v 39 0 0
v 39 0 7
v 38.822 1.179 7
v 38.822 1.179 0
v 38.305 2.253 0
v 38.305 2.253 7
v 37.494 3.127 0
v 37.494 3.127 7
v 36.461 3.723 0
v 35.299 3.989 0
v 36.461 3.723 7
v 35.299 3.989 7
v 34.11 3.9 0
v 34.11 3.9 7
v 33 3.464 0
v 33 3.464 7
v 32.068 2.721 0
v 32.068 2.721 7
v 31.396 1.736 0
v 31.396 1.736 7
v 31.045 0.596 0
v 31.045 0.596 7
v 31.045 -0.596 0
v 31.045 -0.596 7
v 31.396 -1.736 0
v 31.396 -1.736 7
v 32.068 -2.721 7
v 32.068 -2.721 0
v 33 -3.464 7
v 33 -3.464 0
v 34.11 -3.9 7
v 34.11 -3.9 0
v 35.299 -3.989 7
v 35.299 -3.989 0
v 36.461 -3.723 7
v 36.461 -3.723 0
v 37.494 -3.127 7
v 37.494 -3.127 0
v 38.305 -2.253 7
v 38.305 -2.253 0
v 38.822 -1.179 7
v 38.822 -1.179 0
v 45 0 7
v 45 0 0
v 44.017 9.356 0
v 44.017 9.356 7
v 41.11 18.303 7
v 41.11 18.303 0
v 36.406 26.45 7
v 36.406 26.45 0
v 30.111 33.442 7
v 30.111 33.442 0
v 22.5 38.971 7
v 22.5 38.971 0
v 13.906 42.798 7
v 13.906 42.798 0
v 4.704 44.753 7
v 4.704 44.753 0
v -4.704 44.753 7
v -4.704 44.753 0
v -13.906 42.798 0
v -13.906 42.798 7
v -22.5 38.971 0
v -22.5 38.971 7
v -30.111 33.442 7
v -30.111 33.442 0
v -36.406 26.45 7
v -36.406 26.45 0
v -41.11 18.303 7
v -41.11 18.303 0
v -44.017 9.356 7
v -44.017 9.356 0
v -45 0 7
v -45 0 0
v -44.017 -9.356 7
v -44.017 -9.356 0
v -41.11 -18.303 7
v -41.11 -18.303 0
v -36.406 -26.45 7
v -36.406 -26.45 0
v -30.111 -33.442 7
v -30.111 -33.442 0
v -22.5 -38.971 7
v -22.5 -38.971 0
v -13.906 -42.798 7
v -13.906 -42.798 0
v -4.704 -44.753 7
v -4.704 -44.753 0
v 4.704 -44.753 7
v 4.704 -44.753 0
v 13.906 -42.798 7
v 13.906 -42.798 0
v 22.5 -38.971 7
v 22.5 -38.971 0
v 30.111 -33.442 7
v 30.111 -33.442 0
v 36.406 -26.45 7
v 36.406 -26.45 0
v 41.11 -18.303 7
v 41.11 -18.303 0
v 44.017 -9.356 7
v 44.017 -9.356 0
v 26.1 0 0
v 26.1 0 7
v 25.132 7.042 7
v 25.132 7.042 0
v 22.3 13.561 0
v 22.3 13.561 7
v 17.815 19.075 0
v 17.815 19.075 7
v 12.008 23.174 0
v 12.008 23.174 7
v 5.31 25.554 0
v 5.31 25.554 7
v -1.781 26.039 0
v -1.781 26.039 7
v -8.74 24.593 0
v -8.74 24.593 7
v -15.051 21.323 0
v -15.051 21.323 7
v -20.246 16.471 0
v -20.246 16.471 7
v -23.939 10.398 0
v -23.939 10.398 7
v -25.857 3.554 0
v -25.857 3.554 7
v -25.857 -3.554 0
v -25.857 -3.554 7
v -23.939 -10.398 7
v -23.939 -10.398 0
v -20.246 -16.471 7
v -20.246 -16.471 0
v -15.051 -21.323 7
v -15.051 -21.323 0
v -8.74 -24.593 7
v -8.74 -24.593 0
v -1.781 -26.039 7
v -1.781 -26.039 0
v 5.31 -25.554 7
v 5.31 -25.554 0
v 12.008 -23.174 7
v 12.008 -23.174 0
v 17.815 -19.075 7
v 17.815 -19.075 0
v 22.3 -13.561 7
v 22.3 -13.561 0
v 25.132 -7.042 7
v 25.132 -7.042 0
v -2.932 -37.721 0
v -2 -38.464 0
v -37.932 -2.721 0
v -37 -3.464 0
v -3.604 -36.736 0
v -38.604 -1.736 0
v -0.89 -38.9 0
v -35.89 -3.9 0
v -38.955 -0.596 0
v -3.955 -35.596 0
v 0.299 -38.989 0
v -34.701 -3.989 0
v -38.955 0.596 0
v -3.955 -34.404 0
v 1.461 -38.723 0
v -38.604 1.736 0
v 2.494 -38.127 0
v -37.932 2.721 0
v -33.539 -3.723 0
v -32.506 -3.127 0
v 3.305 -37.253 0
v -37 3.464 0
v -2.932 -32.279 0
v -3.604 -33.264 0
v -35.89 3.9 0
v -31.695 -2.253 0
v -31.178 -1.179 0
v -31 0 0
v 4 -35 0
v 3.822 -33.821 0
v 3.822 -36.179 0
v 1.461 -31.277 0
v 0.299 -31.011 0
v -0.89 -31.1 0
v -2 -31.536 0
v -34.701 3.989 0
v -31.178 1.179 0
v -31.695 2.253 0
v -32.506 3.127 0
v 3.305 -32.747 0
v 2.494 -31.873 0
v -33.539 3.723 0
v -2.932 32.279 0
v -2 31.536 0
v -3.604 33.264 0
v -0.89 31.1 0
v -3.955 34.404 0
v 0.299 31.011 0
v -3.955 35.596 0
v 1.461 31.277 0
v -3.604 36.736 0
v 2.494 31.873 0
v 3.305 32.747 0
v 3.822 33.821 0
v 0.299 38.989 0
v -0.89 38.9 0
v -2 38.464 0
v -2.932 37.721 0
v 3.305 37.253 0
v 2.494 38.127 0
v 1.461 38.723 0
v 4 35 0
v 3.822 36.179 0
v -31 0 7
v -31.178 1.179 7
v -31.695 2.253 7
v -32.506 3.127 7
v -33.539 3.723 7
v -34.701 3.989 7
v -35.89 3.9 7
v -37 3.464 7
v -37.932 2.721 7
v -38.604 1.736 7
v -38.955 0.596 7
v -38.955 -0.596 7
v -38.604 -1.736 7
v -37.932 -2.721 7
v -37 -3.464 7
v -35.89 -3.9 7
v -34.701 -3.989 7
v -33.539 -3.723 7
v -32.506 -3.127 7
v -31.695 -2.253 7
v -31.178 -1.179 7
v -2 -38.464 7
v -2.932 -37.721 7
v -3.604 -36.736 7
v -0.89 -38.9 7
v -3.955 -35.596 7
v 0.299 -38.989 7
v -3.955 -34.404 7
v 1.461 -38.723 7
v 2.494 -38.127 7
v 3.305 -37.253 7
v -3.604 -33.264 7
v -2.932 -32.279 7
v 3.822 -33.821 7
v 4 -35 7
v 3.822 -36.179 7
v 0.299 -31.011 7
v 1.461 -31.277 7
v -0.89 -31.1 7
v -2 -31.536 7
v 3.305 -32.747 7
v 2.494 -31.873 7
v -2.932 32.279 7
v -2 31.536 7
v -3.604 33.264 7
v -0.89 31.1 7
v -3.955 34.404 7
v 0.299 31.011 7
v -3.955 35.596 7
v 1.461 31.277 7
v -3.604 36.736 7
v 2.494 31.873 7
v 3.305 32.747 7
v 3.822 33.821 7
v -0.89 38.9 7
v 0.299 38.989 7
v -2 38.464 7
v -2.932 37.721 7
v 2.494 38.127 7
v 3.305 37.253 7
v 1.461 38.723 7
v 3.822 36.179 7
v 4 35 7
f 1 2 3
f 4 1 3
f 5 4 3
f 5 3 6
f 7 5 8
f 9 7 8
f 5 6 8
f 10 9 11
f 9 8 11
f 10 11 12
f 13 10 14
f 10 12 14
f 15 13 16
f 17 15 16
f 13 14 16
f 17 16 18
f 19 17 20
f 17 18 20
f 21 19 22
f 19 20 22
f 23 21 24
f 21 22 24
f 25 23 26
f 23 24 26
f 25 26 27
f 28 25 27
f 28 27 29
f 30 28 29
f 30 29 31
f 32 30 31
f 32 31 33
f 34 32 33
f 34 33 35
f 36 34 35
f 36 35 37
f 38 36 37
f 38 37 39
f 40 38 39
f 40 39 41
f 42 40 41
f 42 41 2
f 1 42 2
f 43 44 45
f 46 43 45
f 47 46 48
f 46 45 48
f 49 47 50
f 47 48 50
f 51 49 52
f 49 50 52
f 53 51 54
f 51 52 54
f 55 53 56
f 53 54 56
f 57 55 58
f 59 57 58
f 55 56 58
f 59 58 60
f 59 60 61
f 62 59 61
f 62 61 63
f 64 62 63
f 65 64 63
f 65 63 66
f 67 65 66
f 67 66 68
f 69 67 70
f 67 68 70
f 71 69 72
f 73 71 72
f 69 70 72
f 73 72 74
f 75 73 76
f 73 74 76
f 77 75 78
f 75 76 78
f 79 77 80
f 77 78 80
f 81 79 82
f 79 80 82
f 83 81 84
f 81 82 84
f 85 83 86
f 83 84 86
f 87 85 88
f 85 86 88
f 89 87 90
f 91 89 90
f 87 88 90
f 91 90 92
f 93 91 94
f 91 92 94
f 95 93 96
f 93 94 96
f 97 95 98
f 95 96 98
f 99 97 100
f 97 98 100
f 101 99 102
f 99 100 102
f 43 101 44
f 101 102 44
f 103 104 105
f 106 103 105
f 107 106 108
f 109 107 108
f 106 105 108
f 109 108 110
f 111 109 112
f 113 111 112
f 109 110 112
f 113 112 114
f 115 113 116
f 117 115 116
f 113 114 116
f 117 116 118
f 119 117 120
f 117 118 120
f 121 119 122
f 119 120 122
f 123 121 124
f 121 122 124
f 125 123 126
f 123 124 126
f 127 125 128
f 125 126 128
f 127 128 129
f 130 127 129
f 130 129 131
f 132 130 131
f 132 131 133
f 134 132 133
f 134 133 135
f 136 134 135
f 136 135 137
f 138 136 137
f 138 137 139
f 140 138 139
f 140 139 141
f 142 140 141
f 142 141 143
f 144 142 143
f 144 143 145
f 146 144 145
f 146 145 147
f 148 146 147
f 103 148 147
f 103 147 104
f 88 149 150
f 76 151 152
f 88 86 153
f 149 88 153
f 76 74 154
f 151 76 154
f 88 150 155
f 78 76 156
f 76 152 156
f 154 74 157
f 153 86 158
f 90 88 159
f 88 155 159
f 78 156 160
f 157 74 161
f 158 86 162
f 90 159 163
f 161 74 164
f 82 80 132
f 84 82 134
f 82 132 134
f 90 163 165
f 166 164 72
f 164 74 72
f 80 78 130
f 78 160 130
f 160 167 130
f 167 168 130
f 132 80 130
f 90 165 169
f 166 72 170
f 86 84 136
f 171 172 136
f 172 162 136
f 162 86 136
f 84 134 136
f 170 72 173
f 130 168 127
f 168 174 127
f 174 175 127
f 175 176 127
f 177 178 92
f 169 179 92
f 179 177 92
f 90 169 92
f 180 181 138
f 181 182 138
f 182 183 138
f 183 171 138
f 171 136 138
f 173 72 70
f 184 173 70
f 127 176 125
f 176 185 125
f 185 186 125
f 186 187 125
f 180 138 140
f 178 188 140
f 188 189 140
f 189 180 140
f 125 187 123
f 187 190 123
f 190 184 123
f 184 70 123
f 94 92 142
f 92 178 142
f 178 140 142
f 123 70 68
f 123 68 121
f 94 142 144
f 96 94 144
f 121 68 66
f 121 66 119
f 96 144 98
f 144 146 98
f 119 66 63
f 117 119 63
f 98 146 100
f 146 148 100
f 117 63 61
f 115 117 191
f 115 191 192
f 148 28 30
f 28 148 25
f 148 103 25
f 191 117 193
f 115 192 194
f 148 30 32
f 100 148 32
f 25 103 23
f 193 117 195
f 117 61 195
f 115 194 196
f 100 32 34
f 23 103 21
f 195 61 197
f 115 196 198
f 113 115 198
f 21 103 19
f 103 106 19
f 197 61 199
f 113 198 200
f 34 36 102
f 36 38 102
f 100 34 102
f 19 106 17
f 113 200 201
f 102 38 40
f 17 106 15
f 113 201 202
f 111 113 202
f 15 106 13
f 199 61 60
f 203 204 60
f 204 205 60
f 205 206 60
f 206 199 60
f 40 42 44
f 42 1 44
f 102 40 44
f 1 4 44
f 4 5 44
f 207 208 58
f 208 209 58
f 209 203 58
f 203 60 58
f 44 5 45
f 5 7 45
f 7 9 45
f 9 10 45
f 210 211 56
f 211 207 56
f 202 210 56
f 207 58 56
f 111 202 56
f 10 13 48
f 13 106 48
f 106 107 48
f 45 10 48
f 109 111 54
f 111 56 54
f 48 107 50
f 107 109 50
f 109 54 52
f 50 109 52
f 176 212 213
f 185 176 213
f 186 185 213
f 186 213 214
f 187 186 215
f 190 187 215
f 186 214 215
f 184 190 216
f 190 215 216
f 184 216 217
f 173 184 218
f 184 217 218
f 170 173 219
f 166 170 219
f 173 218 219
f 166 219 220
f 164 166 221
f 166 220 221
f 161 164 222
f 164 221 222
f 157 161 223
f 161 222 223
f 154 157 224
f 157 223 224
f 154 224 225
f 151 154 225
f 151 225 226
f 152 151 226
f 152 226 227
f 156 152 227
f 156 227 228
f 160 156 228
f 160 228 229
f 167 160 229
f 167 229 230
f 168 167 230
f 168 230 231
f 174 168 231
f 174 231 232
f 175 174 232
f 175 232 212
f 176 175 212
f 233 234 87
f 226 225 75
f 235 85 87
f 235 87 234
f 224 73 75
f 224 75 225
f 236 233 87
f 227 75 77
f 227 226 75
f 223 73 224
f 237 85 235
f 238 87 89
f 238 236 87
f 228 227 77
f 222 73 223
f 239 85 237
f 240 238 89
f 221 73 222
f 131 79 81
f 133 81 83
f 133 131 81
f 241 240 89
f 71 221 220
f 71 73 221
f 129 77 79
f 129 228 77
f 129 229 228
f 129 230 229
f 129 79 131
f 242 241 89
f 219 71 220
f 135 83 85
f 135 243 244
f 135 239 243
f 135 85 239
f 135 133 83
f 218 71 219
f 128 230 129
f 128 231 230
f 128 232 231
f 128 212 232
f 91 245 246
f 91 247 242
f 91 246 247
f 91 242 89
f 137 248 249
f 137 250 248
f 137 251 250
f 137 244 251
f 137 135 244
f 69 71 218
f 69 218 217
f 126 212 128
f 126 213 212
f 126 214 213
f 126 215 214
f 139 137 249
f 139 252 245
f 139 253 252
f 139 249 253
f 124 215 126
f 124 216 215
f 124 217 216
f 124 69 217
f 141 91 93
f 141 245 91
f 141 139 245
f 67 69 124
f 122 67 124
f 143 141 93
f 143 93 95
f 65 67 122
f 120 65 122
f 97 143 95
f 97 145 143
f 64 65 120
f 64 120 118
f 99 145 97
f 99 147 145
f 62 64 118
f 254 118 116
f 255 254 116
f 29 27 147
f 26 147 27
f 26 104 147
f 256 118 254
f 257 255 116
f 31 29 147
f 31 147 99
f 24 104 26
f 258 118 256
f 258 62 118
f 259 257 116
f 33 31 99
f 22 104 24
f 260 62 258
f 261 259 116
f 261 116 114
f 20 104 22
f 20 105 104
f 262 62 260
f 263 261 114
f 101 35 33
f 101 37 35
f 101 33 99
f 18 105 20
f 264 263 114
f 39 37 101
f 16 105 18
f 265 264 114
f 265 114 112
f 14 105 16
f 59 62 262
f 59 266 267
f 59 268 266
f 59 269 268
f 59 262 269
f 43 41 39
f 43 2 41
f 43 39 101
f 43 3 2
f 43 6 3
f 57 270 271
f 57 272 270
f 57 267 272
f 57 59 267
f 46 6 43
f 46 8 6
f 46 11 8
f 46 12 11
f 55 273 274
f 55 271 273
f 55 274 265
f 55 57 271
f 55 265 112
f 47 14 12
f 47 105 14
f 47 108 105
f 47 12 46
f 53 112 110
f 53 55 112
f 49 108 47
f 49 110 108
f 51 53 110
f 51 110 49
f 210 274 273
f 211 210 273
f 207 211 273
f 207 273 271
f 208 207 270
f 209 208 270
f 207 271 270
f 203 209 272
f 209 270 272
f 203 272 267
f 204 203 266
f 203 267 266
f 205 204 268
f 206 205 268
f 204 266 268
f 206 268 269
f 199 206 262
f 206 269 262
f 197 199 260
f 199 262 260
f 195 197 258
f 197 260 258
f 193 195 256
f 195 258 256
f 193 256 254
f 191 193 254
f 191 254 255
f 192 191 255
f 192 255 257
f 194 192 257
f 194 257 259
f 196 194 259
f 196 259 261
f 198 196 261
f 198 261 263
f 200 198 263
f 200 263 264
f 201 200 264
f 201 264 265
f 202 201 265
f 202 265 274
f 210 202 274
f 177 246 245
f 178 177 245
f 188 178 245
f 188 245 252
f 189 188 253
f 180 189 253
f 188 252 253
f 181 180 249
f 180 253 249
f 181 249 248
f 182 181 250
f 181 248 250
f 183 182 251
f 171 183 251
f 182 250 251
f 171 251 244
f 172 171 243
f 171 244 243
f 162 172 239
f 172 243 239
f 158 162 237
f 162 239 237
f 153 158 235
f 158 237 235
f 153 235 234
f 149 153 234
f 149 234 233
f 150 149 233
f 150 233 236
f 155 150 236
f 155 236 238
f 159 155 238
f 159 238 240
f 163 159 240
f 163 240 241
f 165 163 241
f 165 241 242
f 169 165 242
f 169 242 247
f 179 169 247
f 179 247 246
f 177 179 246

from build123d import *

# Parameters (mm, degrees)
CROQUIS1_R              = 45
SALIENTE_EXTRUIR1_DEPTH = 7
CROQUIS2_R              = 26.1
CORTAR_EXTRUIR1_DEPTH   = 8
CROQUIS3_R              = 4
CORTAR_EXTRUIR2_DEPTH   = 8


with BuildPart() as part:
    # Croquis1 → Saliente-Extruir1 (new body)
    with BuildSketch(Plane.XY):
        Circle(CROQUIS1_R)
    extrude(amount=SALIENTE_EXTRUIR1_DEPTH)

    # Croquis2 → Cortar-Extruir1 (cut, through all)
    with BuildSketch(Plane.XY.offset(7)):
        Circle(CROQUIS2_R)
    extrude(amount=-CORTAR_EXTRUIR1_DEPTH, mode=Mode.SUBTRACT)

    # Croquis3 → Cortar-Extruir2 (cut, through all)
    with BuildSketch(Plane.XY.offset(7)):
        with Locations((0, 35)):
            Circle(CROQUIS3_R)
        with Locations((35, 0)):
            Circle(CROQUIS3_R)
        with Locations((0, -35)):
            Circle(CROQUIS3_R)
        with Locations((-35, 0)):
            Circle(CROQUIS3_R)
    extrude(amount=-CORTAR_EXTRUIR2_DEPTH, mode=Mode.SUBTRACT)


solid = part.part
